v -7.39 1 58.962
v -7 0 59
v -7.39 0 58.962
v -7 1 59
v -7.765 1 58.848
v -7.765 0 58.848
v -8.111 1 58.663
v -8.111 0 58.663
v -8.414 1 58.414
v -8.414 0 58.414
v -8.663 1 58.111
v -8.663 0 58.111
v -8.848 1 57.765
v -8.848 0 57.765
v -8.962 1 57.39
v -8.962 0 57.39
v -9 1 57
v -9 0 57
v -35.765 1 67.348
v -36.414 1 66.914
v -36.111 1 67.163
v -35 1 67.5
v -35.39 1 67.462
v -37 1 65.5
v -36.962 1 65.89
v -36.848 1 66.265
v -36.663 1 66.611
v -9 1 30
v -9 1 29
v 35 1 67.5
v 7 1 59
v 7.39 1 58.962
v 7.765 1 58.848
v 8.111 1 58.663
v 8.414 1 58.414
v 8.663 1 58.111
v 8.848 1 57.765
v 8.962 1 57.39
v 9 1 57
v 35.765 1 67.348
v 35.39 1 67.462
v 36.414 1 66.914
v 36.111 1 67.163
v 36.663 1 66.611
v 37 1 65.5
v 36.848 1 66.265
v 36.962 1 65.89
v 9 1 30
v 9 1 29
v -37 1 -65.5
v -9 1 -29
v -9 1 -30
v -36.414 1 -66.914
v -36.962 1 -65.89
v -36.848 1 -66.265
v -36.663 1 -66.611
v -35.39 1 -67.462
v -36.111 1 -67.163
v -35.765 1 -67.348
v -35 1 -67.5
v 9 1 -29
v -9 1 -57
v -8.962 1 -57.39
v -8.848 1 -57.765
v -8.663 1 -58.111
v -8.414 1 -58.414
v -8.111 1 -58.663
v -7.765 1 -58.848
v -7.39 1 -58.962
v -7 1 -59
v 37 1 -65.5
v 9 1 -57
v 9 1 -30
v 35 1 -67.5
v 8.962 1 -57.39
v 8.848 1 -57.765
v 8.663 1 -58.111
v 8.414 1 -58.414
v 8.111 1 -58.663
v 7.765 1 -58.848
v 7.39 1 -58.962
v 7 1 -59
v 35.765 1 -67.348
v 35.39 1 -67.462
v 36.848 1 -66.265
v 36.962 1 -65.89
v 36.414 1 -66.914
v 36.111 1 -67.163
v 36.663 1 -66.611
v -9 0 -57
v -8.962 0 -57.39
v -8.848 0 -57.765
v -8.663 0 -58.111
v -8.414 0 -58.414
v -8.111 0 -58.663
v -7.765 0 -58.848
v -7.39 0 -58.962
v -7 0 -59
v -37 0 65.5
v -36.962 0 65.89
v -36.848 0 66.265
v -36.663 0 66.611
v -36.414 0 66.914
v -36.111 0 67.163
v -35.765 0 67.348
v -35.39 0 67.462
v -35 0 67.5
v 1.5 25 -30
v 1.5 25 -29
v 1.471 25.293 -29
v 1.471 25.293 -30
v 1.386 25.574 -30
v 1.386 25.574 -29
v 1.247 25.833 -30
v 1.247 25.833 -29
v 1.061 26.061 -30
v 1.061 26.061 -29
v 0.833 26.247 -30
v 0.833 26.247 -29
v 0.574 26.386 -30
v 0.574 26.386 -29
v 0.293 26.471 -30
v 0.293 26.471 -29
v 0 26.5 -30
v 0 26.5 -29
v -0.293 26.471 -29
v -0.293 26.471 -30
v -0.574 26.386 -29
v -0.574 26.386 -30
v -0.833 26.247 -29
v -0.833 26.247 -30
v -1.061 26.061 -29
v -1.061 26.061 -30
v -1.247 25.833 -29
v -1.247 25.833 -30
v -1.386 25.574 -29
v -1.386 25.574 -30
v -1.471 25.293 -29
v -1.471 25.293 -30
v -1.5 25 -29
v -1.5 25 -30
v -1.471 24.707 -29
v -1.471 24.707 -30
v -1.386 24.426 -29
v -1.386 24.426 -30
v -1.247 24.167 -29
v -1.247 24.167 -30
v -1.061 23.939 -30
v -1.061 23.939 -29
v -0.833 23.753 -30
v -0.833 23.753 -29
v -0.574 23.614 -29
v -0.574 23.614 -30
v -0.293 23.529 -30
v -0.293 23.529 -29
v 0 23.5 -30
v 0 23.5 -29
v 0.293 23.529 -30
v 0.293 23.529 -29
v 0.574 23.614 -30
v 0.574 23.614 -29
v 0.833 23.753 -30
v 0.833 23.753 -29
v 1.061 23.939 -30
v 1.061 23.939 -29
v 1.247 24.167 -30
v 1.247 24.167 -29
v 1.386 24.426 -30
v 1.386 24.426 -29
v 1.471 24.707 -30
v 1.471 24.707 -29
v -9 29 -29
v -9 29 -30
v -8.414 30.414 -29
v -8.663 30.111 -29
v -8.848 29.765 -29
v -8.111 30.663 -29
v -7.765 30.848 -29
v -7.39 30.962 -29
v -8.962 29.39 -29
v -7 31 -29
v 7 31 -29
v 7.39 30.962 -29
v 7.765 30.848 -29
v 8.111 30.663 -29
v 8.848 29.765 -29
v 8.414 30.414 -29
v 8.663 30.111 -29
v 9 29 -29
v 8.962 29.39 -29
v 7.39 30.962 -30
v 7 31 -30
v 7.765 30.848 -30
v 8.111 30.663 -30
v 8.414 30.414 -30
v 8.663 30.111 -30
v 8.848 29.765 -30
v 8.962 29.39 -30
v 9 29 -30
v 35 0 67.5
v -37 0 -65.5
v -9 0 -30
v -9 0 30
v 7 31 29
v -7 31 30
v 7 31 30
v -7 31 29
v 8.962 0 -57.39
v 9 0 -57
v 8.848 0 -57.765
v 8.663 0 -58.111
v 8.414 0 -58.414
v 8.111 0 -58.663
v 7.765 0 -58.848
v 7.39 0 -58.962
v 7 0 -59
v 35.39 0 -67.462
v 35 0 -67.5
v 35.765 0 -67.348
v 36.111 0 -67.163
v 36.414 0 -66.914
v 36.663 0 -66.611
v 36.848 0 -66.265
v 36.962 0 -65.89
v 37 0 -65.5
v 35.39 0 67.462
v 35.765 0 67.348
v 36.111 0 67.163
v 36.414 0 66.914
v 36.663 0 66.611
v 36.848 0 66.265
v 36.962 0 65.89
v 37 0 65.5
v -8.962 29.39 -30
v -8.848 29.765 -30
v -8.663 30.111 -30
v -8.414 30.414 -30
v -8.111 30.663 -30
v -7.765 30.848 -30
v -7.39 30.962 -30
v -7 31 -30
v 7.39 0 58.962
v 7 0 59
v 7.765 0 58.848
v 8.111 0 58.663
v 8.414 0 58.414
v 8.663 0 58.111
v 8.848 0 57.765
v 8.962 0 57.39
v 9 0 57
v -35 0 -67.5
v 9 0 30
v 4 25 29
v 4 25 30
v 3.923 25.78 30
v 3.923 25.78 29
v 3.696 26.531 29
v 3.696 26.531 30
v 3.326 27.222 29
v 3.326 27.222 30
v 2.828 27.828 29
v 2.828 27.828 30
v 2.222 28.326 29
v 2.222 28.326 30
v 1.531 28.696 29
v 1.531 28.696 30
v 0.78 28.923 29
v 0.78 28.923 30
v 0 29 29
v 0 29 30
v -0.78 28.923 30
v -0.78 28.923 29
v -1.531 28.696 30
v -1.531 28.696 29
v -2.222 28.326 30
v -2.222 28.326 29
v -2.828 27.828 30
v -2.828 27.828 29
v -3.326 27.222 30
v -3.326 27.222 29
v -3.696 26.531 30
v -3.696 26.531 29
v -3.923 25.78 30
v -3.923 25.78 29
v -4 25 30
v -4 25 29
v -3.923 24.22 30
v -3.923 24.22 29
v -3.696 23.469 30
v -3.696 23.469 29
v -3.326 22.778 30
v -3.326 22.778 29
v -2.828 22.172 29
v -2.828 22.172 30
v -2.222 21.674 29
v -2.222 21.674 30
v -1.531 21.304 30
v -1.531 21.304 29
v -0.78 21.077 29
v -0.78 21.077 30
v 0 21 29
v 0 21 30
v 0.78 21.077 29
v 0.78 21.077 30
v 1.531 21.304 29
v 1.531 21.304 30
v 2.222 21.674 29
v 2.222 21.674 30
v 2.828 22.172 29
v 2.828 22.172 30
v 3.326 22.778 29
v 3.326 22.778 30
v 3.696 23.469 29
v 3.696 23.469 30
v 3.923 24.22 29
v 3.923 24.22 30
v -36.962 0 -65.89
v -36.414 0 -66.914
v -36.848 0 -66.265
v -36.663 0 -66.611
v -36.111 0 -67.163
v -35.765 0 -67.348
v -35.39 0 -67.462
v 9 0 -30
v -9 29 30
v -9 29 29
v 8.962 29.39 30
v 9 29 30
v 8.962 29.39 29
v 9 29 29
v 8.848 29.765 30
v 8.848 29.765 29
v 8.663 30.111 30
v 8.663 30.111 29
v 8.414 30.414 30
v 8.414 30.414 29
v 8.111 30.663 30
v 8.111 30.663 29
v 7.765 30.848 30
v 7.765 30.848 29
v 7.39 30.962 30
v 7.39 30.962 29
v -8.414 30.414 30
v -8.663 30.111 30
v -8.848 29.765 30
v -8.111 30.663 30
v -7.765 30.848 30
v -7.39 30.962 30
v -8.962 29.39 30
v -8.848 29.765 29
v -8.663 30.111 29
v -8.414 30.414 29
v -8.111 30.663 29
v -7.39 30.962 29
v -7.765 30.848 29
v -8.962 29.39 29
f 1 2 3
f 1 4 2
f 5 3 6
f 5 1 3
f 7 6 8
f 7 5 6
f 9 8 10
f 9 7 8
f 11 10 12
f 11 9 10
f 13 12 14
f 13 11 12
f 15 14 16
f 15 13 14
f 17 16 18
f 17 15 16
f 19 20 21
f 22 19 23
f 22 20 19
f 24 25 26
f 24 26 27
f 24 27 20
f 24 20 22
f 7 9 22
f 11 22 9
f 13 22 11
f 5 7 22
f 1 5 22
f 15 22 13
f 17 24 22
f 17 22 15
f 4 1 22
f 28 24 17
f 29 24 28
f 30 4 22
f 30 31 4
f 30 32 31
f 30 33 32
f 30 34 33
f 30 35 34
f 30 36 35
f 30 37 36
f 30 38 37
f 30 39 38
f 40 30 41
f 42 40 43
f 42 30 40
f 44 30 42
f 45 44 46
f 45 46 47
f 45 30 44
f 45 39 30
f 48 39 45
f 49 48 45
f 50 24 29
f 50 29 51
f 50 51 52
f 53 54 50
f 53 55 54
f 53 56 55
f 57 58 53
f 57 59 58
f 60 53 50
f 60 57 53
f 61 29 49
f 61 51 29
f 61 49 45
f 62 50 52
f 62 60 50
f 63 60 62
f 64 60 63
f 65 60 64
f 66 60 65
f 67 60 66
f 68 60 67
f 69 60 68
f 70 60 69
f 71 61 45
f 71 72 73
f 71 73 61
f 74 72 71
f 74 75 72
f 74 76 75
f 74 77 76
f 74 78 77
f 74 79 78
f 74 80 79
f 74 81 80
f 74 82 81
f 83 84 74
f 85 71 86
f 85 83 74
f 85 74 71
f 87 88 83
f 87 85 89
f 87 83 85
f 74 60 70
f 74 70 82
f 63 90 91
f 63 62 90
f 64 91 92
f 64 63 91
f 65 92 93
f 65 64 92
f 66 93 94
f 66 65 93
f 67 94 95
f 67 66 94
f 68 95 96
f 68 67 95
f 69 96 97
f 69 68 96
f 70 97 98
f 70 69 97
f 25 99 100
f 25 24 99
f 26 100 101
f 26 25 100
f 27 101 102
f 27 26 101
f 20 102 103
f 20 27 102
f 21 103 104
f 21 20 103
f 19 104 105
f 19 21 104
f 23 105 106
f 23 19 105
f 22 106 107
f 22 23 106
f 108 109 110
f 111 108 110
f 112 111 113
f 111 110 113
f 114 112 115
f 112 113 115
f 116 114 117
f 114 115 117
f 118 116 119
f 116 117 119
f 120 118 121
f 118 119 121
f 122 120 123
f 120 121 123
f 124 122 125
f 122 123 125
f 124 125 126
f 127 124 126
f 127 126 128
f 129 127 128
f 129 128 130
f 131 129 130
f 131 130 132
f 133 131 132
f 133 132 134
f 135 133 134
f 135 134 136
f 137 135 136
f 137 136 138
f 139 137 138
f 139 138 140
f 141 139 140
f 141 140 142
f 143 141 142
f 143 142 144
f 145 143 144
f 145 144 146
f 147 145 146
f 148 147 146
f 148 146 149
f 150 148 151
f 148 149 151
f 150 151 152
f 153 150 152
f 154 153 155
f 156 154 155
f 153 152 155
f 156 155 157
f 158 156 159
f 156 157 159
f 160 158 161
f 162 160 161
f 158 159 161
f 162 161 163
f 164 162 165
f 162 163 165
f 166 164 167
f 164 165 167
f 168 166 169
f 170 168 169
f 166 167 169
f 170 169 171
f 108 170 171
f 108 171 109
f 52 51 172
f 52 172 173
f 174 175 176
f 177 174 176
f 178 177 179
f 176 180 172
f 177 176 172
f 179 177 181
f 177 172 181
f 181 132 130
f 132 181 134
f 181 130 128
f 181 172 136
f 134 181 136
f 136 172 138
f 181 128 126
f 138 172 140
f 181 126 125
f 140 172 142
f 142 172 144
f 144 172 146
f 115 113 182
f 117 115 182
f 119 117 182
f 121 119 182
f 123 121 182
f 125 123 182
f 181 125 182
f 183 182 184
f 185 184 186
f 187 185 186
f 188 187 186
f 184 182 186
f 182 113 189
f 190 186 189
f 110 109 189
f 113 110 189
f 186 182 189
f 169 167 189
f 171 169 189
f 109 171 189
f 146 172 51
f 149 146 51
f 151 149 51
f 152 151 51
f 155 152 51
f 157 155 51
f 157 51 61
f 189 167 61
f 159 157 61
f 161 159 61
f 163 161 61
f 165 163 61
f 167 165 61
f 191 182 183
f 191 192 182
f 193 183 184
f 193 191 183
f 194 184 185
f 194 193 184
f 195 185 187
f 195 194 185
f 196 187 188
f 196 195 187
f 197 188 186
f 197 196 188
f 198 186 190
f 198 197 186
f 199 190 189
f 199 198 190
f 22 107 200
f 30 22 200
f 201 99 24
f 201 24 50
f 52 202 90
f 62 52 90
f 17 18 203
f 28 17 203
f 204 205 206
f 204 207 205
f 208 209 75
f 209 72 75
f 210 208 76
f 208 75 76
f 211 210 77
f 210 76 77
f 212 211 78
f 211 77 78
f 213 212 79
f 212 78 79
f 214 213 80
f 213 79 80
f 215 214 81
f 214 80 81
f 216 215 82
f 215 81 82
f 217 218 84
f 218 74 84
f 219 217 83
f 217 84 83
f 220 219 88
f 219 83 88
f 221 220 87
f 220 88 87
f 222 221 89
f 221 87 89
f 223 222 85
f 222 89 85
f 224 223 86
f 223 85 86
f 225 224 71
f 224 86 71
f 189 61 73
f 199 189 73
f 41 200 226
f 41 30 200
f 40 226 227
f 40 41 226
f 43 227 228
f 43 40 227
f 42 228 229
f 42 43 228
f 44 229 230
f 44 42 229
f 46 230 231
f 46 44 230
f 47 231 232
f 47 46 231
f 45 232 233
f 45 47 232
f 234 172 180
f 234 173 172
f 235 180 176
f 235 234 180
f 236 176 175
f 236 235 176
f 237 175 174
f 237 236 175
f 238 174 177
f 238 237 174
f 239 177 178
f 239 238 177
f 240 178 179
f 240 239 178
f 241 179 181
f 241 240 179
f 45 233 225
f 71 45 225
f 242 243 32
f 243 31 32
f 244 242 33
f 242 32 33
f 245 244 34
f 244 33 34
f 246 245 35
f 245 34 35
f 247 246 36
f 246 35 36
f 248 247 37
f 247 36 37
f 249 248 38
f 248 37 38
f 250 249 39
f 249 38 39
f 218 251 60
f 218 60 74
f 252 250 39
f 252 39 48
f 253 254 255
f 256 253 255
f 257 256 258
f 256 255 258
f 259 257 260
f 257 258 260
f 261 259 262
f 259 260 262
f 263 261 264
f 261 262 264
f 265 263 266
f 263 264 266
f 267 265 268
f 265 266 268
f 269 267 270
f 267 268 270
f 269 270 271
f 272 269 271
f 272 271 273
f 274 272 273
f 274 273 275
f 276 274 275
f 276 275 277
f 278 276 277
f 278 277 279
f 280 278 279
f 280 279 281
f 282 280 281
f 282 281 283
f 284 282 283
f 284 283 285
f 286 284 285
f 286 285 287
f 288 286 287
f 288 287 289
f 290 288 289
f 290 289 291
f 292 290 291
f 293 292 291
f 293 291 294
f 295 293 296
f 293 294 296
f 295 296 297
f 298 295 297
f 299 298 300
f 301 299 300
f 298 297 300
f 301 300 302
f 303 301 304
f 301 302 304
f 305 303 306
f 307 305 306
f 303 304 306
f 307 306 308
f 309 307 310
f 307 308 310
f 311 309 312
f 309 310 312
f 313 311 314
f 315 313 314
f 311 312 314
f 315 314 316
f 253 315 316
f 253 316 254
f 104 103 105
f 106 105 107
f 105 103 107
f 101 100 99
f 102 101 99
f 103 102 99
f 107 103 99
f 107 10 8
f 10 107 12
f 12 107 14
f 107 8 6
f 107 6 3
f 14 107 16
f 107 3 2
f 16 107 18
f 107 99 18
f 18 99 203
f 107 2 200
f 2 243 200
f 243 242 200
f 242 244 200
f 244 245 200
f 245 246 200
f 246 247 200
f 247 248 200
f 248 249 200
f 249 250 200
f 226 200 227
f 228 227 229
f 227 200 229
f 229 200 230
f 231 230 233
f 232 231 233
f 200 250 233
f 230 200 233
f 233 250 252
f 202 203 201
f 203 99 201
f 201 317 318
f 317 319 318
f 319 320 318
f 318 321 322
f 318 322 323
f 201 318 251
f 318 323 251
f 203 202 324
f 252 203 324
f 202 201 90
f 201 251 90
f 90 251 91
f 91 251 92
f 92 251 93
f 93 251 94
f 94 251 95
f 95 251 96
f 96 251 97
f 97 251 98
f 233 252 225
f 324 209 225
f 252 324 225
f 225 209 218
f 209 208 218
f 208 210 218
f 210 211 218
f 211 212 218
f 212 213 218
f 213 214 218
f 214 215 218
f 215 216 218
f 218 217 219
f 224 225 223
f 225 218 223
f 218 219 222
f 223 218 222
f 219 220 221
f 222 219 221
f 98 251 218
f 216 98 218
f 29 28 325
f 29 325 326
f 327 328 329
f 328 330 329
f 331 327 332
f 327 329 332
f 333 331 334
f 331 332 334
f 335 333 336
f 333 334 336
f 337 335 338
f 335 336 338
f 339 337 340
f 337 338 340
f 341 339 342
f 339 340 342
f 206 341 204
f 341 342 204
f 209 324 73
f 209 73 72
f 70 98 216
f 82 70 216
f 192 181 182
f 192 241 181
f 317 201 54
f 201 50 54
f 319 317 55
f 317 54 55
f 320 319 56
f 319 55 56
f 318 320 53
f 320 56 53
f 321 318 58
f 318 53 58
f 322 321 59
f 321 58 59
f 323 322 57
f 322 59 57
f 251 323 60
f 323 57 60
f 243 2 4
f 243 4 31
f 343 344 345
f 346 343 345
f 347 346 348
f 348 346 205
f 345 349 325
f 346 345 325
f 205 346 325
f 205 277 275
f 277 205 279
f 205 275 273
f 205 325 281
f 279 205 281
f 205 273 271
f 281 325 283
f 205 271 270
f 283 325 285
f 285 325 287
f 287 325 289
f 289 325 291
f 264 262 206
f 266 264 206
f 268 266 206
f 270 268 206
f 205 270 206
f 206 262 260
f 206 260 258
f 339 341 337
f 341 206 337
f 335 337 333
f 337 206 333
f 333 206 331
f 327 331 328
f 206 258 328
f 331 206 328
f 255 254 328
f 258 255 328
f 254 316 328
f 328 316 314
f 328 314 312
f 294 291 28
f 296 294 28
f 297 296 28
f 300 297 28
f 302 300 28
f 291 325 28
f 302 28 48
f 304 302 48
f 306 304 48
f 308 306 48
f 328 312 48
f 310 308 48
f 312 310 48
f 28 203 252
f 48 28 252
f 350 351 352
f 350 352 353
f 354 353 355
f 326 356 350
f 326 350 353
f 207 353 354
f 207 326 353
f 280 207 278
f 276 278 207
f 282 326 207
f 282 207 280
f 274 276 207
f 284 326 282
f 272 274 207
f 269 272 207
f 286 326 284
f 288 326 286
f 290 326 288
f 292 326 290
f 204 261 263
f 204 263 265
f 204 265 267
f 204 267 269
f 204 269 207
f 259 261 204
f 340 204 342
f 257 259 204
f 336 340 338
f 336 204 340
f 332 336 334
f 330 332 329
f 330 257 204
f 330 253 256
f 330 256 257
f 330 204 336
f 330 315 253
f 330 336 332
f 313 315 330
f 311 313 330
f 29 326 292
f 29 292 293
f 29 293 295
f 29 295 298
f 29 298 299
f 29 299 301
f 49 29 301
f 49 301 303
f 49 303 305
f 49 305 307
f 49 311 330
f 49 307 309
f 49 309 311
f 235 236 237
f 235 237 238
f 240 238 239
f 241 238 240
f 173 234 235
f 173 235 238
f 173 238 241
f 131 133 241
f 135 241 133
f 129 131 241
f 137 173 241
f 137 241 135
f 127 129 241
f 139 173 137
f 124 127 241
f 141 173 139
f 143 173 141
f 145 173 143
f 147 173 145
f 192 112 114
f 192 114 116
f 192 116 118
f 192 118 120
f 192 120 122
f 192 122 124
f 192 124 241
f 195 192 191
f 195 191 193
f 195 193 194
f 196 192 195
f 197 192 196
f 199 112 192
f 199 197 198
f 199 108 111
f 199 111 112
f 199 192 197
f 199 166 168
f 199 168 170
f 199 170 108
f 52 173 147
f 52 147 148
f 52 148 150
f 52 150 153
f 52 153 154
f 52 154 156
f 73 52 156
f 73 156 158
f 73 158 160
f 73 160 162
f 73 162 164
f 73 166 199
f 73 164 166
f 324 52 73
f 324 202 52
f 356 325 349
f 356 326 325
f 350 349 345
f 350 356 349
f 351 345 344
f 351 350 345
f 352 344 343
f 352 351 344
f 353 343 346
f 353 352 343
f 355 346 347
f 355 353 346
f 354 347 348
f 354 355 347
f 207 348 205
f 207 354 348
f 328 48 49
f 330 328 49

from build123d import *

# Parameters (mm, degrees)
SKETCH1_W           = 74
SKETCH1_H           = 135
SKETCH1_W_2         = 18
SKETCH1_H_2         = 30
BOSS_EXTRUDE1_DEPTH = 1
BOSS_EXTRUDE2_START = -1
SKETCH2_W           = 18
SKETCH2_H           = 1
BOSS_EXTRUDE2_DEPTH = 31
CUT_EXTRUDE3_REACH  = 99.5
SKETCH5_R           = 4
CUT_EXTRUDE4_REACH  = 40.5
SKETCH6_R           = 1.5
FILLET2_R           = 2


with BuildPart() as part:
    # Sketch1 → Boss-Extrude1 (new body)
    with BuildSketch(Plane(origin=(0, 0, 0), x_dir=(1, 0, 0), z_dir=(0, 1, 0))):
        Rectangle(SKETCH1_W, SKETCH1_H)
        with Locations((0, 44)):
            Rectangle(SKETCH1_W_2, SKETCH1_H_2, mode=Mode.SUBTRACT)
        with Locations((0, -44)):
            Rectangle(SKETCH1_W_2, SKETCH1_H_2, mode=Mode.SUBTRACT)
    extrude(amount=BOSS_EXTRUDE1_DEPTH)

    # Sketch2 → Boss-Extrude2 (add)
    with BuildSketch(Plane(origin=(0, 1, 0), x_dir=(1, 0, 0), z_dir=(0, 1, 0)).offset(BOSS_EXTRUDE2_START)):
        with Locations((0, 29.5)):
            Rectangle(SKETCH2_W, SKETCH2_H)
        with Locations((0, -29.5)):
            Rectangle(SKETCH2_W, SKETCH2_H)
    extrude(amount=BOSS_EXTRUDE2_DEPTH)

    # Sketch5 → Cut-Extrude3 (cut, up to next)
    with BuildSketch(Plane.XY.offset(30), mode=Mode.PRIVATE) as cut_extrude3_sk1:
        with Locations((0, 25)):
            Circle(SKETCH5_R)
    cut_extrude3_tool1 = extrude(cut_extrude3_sk1.sketch, amount=-CUT_EXTRUDE3_REACH, mode=Mode.PRIVATE) & part.part
    add(cut_extrude3_tool1.solids().sort_by_distance((0, 25, 30))[0], mode=Mode.SUBTRACT)

    # Sketch6 → Cut-Extrude4 (cut, up to next)
    with BuildSketch(Plane.XY.offset(-29), mode=Mode.PRIVATE) as cut_extrude4_sk1:
        with Locations((0, 25)):
            Circle(SKETCH6_R)
    cut_extrude4_tool1 = extrude(cut_extrude4_sk1.sketch, amount=-CUT_EXTRUDE4_REACH, mode=Mode.PRIVATE) & part.part
    add(cut_extrude4_tool1.solids().sort_by_distance((0, 25, -29))[0], mode=Mode.SUBTRACT)

    # Fillet2
    fillet2_edges = [part.edges().sort_by_distance(p)[0] for p in [
        (9, 0.5, -59),
        (-9, 0.5, -59),
        (-9, 0.5, 59),
        (9, 0.5, 59),
        (-9, 31, -29.5),
        (9, 31, -29.5),
        (-9, 31, 29.5),
        (9, 31, 29.5),
        (37, 0.5, 67.5),
        (-37, 0.5, 67.5),
        (-37, 0.5, -67.5),
        (37, 0.5, -67.5),
    ]]
    fillet(fillet2_edges, radius=FILLET2_R)


solid = part.part
